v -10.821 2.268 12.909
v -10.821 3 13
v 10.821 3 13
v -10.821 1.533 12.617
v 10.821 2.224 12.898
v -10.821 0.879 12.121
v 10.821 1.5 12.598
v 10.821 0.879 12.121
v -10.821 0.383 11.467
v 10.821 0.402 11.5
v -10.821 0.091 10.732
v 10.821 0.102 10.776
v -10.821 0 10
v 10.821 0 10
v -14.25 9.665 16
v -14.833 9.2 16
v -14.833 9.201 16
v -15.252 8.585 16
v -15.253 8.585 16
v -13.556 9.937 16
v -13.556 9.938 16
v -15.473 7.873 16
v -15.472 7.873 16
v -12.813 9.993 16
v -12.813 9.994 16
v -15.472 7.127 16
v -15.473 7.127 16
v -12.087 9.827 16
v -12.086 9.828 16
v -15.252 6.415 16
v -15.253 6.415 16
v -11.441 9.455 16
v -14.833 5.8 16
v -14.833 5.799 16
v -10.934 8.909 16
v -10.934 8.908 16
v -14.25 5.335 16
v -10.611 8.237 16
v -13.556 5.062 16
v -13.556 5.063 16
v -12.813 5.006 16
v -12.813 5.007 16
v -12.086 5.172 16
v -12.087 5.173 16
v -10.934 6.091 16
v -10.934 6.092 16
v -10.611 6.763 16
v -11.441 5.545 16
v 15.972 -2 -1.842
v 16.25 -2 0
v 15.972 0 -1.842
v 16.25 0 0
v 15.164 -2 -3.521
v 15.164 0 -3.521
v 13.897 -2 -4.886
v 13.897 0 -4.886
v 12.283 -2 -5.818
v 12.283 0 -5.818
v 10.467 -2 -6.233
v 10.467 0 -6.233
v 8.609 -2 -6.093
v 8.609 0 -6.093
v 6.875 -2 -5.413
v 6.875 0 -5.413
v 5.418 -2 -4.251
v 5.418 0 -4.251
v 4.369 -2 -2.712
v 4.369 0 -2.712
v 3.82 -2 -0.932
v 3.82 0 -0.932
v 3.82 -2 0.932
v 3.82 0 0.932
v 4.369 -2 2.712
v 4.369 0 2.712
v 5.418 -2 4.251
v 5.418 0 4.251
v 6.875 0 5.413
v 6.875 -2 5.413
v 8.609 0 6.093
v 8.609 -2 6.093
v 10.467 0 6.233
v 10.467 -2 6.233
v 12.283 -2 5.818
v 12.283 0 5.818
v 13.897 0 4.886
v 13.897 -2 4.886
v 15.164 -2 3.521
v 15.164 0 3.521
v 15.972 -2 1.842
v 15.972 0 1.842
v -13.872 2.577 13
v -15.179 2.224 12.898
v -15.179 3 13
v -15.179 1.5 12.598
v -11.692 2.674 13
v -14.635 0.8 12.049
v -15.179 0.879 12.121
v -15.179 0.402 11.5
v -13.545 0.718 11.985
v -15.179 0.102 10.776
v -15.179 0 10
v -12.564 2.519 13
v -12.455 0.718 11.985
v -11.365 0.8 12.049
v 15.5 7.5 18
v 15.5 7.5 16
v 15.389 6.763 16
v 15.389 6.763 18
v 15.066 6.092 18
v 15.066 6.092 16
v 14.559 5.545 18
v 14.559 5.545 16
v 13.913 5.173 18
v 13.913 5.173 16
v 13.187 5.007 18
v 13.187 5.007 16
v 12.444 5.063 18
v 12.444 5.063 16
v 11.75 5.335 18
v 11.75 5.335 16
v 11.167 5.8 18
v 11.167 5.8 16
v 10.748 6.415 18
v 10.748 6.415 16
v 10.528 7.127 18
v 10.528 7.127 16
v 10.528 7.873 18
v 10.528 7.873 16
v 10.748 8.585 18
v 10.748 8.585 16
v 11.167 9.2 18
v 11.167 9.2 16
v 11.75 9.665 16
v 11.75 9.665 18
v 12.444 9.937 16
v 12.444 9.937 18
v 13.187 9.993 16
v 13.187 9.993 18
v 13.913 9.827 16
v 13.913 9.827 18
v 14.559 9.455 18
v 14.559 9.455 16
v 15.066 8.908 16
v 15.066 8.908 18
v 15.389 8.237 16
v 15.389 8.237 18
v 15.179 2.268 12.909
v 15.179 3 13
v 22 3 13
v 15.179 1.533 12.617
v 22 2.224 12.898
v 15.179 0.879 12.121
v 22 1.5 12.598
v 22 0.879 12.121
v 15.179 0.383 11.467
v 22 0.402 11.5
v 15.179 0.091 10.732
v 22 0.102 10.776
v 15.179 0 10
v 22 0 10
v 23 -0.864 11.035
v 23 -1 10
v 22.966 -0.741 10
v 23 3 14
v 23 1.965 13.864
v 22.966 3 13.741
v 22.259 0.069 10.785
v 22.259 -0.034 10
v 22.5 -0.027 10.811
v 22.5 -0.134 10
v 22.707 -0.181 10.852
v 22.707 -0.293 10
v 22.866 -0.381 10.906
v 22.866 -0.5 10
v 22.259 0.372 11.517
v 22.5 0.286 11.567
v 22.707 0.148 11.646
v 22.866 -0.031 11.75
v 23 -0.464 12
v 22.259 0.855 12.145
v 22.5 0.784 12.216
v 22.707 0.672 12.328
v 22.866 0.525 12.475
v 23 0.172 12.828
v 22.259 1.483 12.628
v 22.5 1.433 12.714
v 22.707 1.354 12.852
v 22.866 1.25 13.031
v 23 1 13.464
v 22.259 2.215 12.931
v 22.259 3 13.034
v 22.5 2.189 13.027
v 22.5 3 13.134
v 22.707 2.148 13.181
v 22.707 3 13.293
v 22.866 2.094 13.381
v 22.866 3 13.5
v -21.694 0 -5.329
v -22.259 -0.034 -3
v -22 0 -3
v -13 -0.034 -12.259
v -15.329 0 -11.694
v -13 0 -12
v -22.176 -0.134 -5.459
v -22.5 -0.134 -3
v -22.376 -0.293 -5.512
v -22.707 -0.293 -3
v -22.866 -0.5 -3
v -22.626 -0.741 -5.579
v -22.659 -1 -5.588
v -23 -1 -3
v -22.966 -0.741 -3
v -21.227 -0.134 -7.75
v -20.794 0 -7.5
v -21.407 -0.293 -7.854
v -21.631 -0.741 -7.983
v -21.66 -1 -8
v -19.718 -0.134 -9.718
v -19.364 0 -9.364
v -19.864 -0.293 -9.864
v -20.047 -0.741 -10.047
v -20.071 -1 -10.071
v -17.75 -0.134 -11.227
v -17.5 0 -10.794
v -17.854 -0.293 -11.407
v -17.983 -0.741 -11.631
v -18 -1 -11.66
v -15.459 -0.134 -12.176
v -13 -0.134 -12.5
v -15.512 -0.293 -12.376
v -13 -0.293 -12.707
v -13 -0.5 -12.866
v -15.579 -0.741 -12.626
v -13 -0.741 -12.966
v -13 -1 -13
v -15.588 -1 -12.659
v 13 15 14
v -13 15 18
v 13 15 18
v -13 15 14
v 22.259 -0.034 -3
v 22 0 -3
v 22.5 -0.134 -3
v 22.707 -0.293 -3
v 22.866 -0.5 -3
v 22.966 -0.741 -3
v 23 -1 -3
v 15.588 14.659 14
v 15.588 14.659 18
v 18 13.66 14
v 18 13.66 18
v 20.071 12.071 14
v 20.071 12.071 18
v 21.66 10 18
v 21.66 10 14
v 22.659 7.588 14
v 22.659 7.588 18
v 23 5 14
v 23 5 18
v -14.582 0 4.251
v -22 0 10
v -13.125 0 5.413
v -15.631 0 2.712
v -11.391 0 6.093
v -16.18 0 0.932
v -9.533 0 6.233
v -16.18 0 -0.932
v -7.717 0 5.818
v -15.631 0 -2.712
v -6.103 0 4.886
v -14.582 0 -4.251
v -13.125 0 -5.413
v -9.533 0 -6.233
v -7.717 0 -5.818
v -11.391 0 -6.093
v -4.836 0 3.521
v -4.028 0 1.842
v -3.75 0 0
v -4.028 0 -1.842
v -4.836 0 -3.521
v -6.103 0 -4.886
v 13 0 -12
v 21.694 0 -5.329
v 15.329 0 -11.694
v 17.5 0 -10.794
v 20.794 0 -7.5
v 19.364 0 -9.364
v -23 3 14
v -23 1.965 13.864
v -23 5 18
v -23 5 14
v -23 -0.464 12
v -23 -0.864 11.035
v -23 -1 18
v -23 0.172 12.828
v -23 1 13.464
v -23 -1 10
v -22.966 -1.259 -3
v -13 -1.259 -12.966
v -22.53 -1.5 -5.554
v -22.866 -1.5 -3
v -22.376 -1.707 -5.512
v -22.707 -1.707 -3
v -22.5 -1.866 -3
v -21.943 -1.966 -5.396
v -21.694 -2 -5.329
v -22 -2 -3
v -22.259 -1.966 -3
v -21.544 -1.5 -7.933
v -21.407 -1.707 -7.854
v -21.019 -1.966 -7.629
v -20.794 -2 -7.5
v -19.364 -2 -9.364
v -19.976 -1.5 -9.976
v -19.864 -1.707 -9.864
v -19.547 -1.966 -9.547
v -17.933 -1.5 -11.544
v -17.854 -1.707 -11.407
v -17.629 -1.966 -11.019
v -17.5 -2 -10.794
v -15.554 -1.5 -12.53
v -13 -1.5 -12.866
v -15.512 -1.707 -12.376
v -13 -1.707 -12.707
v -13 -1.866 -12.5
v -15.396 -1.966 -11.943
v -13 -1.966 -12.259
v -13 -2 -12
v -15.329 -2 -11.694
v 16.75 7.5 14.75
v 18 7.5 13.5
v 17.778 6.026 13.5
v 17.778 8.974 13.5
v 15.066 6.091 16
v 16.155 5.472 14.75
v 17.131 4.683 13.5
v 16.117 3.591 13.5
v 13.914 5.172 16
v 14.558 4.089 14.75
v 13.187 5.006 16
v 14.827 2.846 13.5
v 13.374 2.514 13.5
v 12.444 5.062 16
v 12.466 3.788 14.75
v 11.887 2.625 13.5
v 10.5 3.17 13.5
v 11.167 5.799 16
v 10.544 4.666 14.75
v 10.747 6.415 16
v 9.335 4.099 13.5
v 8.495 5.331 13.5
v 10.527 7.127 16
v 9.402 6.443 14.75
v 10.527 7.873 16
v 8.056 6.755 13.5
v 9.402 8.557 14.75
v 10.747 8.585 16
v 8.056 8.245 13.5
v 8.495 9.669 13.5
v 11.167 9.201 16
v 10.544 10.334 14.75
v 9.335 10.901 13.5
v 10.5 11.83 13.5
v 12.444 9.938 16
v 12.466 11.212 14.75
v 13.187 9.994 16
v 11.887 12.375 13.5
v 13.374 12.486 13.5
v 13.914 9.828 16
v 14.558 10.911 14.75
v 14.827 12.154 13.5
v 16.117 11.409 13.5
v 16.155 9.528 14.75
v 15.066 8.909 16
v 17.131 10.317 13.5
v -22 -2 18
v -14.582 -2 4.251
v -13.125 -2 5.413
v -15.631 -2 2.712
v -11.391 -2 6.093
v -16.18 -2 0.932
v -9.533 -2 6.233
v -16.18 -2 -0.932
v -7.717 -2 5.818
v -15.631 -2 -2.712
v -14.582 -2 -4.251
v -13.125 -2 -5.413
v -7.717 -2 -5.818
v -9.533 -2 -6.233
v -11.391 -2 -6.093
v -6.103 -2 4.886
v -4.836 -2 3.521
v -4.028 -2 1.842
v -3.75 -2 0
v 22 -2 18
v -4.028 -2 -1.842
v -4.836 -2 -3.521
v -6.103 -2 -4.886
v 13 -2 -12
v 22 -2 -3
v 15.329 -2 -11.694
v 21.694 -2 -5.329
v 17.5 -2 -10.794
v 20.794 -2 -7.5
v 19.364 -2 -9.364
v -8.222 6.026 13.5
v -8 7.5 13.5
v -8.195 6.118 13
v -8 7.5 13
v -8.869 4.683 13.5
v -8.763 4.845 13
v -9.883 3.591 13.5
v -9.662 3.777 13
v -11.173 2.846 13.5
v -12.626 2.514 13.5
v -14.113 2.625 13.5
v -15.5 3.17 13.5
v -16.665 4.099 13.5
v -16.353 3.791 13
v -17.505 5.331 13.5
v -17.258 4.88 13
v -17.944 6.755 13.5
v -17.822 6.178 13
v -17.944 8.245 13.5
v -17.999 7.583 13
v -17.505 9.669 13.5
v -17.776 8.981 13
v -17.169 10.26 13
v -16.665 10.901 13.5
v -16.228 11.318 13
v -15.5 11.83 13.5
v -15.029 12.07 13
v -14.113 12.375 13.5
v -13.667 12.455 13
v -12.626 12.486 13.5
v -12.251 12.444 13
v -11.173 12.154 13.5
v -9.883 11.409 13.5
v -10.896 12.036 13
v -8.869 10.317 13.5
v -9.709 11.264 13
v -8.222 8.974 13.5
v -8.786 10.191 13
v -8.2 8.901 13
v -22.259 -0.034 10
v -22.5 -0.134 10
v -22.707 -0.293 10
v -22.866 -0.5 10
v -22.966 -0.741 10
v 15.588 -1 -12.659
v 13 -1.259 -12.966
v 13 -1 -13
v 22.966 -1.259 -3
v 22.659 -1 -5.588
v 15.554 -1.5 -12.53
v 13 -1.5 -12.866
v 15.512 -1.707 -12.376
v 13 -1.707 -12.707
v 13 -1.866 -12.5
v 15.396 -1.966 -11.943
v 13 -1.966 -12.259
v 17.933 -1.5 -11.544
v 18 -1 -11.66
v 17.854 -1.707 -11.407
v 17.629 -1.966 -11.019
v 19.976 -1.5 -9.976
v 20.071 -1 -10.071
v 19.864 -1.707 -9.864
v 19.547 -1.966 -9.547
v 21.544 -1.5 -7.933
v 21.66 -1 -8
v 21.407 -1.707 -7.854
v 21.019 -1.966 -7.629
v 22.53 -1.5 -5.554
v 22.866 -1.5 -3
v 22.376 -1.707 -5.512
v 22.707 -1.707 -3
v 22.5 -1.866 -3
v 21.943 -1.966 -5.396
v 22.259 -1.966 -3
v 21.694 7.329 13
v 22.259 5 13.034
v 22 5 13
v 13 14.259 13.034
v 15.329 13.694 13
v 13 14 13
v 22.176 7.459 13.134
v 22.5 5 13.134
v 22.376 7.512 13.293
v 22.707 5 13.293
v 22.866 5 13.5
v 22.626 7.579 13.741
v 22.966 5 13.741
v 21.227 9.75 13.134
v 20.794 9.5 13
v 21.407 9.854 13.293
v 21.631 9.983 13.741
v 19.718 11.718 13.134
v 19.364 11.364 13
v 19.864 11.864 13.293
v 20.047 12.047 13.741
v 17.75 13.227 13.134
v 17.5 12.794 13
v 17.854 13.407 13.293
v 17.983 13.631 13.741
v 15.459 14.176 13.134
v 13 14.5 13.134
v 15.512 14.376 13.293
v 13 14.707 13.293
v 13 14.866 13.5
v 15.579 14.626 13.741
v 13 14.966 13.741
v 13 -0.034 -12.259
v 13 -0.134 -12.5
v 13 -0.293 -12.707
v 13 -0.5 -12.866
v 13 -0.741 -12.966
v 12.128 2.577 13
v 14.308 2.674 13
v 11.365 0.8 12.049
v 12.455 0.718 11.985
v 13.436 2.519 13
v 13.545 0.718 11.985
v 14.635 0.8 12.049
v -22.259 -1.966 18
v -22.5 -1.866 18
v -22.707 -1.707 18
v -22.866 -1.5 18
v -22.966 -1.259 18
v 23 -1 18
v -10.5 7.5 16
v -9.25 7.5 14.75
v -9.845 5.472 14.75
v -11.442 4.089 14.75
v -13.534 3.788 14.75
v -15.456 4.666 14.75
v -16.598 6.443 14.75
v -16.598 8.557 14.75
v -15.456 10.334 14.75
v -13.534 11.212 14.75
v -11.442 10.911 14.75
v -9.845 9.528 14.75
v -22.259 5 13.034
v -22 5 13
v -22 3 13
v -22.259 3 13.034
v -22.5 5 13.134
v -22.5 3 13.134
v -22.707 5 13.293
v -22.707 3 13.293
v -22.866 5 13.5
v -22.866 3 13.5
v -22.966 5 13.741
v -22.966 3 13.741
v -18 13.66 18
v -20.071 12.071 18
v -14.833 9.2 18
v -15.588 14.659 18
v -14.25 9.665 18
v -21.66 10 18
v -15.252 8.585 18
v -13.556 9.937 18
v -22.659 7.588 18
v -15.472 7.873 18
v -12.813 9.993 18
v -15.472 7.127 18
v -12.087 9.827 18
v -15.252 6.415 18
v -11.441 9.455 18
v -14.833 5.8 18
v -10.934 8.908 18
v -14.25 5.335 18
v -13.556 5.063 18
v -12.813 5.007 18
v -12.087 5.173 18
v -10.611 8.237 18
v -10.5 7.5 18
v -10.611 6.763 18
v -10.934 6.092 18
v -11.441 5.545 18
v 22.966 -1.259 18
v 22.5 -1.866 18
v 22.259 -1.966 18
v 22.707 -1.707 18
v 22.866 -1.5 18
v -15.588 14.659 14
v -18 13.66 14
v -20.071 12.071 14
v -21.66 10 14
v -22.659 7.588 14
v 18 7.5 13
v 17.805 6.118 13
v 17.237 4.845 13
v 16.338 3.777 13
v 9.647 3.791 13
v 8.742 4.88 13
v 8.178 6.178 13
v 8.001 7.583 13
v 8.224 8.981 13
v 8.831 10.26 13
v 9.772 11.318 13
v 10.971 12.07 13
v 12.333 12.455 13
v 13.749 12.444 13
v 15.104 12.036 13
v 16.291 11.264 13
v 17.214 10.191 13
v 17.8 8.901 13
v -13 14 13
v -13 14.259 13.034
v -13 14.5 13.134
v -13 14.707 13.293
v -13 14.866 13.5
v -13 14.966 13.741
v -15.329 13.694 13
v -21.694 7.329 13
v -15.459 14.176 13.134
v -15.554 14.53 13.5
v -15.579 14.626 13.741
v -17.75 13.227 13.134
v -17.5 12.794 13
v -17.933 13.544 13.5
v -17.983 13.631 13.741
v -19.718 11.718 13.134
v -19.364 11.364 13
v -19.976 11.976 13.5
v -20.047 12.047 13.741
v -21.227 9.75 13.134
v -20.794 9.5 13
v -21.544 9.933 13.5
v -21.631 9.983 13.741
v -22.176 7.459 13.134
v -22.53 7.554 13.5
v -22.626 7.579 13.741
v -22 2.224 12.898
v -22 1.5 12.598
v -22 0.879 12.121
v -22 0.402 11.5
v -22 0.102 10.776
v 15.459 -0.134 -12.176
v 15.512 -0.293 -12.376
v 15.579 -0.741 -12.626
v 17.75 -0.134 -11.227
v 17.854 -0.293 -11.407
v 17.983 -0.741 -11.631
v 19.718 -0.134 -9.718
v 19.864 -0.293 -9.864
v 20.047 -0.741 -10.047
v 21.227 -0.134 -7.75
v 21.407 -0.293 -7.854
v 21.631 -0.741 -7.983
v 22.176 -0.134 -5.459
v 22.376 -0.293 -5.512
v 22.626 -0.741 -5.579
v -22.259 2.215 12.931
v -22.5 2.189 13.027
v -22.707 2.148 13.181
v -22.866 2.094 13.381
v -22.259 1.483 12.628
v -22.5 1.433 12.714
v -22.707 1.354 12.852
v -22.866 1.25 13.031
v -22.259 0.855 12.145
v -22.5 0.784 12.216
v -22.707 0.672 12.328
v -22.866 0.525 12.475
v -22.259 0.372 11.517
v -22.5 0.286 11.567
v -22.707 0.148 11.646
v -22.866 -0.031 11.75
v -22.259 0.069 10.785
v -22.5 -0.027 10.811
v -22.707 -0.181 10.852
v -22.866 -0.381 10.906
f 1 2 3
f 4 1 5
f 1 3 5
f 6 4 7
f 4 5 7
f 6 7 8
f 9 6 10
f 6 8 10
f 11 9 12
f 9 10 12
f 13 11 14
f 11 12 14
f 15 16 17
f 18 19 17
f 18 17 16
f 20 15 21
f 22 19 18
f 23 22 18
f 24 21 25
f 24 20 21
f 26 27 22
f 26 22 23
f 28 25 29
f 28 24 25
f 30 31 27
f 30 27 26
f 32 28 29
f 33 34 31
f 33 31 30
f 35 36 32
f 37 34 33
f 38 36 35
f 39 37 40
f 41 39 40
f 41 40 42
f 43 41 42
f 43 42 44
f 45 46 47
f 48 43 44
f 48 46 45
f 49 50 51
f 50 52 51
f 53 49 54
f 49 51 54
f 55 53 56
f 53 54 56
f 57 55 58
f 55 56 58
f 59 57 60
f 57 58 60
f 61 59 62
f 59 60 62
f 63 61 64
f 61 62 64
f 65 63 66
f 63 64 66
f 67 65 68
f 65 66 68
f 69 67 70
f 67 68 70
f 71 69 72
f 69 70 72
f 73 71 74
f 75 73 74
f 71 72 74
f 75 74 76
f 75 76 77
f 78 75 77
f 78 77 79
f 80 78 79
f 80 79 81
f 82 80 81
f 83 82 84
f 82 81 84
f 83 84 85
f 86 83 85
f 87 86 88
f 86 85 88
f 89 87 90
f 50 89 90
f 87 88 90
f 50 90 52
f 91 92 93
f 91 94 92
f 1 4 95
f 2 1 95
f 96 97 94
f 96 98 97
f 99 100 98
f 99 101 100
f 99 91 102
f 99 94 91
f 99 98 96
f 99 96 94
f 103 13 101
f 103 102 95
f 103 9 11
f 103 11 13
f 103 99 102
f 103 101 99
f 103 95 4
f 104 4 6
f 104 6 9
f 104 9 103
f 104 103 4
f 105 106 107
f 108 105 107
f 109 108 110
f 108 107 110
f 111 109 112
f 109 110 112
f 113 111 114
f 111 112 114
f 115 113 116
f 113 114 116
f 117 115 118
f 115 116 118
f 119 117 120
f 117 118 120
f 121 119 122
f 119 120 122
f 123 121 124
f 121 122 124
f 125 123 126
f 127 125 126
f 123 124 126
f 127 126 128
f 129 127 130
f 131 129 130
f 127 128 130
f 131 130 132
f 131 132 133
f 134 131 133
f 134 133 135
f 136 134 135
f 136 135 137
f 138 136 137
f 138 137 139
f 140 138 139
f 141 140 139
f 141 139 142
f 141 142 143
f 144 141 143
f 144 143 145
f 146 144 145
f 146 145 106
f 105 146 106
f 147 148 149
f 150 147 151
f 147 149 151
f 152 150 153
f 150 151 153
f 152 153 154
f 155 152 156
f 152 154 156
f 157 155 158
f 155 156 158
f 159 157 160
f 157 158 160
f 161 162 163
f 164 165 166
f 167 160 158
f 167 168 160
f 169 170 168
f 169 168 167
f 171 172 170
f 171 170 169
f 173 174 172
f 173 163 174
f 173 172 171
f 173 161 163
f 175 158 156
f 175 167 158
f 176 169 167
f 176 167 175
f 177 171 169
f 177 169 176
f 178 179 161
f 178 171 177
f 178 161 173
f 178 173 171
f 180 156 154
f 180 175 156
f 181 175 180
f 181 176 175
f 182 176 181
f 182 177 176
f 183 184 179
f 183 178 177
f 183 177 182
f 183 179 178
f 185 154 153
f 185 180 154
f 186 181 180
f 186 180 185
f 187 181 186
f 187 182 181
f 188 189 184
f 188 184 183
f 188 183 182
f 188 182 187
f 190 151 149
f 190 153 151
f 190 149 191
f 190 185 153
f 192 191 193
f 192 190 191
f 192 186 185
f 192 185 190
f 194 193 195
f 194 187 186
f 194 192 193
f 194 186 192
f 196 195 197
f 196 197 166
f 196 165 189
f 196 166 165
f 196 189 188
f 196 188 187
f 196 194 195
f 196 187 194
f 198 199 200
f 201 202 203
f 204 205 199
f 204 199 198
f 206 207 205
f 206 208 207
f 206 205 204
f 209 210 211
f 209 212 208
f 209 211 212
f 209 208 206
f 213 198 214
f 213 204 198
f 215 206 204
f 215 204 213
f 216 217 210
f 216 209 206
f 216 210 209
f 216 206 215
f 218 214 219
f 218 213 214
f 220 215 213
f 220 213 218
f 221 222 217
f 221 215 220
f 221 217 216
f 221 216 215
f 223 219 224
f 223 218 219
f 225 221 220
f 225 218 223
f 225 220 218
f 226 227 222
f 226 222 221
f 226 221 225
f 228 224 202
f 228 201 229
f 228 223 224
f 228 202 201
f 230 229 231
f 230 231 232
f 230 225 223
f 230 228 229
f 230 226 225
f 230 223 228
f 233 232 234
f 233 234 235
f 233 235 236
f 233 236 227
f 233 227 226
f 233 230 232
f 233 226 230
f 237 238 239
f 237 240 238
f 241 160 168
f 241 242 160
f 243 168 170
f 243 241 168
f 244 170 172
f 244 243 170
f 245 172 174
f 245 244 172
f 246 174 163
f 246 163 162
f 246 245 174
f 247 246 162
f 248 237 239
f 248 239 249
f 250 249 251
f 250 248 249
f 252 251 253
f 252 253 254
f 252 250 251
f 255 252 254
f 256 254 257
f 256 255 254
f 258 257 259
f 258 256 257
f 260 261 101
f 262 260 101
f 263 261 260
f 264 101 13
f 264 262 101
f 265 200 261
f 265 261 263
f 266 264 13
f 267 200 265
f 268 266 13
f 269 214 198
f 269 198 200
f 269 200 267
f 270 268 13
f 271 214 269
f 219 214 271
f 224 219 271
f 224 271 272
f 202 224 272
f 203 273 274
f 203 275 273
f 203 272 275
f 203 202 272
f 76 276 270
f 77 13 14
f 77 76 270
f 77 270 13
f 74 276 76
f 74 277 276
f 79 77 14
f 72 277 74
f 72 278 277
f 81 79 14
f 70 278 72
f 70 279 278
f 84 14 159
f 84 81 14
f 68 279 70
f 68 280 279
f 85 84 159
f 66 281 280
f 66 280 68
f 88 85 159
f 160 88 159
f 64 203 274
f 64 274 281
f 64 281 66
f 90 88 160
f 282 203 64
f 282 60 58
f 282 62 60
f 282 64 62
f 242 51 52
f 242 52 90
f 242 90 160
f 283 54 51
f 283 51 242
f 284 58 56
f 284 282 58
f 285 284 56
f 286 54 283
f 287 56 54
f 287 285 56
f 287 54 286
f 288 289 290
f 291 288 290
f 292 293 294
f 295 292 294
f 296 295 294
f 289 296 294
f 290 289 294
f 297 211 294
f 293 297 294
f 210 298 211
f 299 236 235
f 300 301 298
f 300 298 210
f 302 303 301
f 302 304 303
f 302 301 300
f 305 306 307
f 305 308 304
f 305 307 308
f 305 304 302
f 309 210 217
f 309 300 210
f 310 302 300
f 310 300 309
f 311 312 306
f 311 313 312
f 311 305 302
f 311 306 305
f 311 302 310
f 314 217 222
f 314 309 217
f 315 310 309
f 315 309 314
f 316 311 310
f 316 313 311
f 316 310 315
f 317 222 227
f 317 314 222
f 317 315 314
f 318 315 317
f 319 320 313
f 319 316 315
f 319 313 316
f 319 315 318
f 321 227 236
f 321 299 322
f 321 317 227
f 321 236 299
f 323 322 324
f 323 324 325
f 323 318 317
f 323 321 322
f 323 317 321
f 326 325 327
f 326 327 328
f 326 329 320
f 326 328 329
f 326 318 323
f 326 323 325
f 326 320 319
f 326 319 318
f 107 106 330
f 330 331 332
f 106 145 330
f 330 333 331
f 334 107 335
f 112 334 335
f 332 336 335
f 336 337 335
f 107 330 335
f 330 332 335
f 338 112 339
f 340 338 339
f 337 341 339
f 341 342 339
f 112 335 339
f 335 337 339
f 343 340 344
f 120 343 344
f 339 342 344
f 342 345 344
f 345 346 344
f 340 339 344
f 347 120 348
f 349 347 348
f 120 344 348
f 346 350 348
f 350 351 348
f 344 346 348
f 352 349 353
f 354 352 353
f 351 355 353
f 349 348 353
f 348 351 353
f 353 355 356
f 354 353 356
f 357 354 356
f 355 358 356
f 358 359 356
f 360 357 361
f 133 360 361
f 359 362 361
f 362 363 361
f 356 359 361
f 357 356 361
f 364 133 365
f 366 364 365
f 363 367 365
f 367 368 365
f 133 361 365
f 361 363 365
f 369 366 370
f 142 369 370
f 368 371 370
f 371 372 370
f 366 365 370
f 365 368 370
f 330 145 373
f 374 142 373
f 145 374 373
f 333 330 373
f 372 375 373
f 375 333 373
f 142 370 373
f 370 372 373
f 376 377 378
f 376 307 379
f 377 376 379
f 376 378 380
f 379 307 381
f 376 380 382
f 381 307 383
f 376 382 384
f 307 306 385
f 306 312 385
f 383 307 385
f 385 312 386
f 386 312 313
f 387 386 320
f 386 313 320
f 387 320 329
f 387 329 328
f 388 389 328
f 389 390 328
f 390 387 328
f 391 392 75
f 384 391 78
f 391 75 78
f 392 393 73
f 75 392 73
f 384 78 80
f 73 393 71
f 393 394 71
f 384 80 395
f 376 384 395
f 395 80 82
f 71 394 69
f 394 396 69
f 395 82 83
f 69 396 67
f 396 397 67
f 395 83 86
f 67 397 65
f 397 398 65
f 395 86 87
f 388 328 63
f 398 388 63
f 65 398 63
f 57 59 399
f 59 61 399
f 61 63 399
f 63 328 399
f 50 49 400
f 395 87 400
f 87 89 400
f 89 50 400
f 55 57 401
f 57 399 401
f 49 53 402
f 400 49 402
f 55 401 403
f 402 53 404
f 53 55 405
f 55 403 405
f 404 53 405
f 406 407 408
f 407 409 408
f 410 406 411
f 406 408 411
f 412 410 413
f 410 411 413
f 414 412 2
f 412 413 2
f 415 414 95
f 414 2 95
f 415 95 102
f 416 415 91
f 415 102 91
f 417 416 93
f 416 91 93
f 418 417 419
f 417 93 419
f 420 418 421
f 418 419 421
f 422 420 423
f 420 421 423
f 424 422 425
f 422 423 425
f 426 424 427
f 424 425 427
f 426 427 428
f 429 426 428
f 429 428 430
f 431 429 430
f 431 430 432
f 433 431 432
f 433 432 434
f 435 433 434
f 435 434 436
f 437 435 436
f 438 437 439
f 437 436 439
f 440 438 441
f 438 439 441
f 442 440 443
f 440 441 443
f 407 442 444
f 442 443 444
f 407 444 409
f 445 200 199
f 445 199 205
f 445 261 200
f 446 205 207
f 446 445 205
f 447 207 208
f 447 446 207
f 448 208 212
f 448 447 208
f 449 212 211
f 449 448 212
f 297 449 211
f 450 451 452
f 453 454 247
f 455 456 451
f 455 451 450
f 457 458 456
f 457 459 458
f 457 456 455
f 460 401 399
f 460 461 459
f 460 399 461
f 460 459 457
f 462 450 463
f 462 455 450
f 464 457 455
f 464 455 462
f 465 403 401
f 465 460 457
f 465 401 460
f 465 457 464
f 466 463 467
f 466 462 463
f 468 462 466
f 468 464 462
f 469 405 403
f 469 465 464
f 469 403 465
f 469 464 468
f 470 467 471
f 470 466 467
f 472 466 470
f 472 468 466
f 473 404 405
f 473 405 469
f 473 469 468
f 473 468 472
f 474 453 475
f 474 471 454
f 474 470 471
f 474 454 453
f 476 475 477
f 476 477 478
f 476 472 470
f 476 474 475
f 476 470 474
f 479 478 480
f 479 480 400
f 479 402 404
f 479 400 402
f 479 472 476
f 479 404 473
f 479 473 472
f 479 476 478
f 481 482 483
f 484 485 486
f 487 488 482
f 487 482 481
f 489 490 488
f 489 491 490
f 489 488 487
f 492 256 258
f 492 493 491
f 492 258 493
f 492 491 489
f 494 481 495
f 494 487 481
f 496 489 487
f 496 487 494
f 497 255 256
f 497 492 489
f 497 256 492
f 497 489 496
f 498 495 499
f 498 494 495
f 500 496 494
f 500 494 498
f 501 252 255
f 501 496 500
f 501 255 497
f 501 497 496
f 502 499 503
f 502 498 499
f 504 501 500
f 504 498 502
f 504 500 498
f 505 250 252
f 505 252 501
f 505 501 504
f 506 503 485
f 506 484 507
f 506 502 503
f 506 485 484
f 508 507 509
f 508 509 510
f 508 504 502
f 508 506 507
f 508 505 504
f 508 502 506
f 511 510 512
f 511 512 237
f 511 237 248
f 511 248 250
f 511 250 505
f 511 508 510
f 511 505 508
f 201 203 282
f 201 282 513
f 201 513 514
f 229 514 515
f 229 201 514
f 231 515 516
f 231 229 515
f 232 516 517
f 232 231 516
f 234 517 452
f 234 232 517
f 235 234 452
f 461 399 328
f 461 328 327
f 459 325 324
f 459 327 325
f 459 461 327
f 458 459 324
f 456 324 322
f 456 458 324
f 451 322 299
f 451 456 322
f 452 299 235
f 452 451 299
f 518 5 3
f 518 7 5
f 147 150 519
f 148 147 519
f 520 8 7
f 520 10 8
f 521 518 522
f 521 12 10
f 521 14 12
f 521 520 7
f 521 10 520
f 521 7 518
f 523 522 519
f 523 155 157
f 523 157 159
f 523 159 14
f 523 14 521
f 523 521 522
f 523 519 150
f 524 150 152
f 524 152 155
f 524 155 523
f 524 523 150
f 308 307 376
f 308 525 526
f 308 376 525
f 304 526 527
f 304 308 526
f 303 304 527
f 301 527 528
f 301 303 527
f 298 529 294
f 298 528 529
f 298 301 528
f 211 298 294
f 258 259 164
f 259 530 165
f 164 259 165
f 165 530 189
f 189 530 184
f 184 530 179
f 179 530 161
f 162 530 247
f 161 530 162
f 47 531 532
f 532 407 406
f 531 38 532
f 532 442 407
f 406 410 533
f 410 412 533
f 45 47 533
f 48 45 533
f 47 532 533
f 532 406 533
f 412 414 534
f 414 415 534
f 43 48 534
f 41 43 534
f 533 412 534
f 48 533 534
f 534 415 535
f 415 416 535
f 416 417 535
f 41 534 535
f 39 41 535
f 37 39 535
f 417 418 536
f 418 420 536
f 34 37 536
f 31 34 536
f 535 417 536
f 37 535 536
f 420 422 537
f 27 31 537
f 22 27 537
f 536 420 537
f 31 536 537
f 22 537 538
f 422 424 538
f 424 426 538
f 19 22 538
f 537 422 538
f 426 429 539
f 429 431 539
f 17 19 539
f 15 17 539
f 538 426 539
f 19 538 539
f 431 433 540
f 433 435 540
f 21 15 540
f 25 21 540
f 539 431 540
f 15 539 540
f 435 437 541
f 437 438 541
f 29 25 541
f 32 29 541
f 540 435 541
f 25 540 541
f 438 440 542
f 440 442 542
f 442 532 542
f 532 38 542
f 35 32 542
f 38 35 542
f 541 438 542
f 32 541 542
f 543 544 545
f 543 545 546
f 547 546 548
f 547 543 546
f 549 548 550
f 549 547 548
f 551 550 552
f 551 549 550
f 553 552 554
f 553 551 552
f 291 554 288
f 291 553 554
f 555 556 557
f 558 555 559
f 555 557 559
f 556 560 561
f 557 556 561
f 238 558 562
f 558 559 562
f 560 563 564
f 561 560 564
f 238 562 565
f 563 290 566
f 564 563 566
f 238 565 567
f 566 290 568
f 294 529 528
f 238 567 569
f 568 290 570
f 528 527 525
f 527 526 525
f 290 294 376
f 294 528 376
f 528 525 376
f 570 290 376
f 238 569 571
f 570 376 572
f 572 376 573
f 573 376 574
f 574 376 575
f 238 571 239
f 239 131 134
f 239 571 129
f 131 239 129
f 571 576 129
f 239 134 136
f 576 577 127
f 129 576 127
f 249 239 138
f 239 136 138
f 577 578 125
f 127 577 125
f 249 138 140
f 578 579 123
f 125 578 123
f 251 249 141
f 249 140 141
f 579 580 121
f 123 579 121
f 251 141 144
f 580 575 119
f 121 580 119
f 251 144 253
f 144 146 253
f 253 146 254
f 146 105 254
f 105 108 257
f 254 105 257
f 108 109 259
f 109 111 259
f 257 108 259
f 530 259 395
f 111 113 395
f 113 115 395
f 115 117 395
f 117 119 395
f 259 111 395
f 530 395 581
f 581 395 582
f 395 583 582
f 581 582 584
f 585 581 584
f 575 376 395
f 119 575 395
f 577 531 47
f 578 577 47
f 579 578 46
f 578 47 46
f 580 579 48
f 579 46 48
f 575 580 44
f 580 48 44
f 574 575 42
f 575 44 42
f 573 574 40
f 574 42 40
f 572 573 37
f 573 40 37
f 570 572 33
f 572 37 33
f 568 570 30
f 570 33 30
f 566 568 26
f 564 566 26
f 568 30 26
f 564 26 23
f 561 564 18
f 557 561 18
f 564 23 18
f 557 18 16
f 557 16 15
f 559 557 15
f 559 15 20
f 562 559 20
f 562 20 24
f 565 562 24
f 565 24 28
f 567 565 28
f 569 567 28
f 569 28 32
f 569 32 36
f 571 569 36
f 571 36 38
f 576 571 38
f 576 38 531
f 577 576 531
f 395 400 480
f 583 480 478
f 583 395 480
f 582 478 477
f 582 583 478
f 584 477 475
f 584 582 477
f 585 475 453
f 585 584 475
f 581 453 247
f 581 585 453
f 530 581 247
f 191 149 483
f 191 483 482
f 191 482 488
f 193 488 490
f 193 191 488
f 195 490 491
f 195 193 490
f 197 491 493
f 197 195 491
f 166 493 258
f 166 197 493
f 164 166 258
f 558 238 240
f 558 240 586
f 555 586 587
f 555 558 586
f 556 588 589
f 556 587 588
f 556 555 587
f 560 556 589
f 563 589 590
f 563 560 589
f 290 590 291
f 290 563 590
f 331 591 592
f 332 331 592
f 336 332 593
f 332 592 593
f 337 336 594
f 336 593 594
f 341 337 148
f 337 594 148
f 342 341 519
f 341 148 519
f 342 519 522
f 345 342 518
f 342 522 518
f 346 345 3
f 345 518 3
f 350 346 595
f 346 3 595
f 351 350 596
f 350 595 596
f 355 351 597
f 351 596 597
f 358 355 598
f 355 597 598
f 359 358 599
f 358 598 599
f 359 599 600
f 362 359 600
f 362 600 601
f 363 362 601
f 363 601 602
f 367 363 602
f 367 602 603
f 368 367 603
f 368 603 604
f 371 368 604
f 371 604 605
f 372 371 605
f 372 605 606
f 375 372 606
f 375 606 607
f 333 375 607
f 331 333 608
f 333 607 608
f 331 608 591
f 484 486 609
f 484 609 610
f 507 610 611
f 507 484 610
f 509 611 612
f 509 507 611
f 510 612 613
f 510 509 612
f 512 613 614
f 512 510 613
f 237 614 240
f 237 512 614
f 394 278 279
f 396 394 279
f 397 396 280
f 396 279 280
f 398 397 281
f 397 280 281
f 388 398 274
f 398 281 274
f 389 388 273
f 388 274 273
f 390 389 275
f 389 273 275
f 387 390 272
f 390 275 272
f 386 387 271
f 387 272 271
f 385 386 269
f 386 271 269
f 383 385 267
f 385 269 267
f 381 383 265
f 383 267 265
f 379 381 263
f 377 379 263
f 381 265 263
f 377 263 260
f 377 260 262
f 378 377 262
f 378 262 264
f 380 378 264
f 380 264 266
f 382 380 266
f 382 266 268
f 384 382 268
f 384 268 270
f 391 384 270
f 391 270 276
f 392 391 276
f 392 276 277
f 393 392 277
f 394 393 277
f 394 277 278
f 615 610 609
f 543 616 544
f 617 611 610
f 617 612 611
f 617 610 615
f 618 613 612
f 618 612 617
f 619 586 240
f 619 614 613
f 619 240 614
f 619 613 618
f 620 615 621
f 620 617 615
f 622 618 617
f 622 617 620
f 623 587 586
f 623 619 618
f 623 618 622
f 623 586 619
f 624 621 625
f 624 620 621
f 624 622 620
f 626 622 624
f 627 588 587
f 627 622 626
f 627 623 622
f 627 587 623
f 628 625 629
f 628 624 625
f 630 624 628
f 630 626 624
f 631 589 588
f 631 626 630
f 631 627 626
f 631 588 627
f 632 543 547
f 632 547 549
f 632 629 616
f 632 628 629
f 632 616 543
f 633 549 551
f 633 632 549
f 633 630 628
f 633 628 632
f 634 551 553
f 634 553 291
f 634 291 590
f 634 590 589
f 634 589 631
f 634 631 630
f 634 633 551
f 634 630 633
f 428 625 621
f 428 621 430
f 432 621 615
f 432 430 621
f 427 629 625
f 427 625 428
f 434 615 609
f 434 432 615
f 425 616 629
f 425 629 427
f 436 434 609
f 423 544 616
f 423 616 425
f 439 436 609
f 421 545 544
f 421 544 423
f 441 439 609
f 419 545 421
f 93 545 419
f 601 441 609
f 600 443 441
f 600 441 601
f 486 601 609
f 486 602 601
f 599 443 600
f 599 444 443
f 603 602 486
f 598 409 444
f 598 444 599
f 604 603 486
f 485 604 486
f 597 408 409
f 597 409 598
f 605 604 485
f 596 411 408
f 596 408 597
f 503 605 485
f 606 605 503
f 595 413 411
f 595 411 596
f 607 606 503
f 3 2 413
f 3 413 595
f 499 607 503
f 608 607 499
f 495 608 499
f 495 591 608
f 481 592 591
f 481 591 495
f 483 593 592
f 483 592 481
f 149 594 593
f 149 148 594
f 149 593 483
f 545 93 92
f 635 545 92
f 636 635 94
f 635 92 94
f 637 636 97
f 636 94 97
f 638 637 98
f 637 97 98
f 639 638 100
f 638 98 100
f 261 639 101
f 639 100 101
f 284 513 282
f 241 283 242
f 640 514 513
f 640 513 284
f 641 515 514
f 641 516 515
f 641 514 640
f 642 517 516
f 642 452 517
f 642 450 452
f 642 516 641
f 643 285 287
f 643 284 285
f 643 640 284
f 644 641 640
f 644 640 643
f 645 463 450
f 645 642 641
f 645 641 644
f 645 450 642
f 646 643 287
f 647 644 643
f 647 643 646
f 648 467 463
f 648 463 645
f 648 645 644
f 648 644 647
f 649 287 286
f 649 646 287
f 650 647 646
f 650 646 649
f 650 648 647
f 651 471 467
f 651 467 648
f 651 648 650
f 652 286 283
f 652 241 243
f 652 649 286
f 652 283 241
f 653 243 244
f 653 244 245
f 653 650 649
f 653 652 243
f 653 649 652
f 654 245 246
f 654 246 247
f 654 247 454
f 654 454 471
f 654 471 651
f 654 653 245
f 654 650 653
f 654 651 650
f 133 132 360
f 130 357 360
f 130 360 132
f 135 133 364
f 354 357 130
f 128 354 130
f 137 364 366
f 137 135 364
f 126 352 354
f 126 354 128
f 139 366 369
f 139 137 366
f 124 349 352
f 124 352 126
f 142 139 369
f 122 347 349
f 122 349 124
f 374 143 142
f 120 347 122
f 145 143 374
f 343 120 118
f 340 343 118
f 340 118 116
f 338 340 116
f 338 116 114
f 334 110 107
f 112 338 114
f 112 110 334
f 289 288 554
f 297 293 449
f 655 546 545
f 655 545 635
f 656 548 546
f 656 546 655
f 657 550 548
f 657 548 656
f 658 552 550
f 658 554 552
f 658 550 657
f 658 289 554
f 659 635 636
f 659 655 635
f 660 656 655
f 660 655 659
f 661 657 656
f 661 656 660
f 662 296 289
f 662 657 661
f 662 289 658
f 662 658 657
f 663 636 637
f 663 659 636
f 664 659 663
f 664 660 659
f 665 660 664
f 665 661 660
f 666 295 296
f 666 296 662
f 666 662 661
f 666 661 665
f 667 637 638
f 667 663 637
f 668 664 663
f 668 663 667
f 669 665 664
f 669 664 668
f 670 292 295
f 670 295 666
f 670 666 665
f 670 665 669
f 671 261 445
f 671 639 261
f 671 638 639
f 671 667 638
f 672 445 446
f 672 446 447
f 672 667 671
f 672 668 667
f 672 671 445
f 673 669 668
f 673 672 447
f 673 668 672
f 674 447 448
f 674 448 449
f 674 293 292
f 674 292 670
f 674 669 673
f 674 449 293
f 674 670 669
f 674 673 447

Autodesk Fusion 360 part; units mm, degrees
sketch "Sketch1" plane through (0, 0, 0) normal (0, 1, 0) x (1, 0, 0)
  circle A0 centre (-10, 0) radius 6.25
  circle A1 centre (-10, 0) radius 9
  circle A2 centre (10, 0) radius 6.25
  circle A3 centre (10, 0) radius 9
  line L0 (-23, -18) -> (23, -18)
  line L1 (23, -18) -> (23, 3)
  line L2 (13, 13) -> (-13, 13)
  line L3 (-23, 3) -> (-23, -18)
  line L4 (-23, -13) -> (23, -13)
  arc A4 (23, 3) -> (13, 13) centre (13, 3) ccw
  arc A5 (-13, 13) -> (-23, 3) centre (-13, 3) ccw
  dimension "d1" = 12.5
  dimension "d2" = 12.5
  dimension "d3" = 18
  dimension "d4" = 18
  dimension "d5" = 10
  dimension "d6" = 10
  dimension "d7" = 13
  dimension "d9" = 13
  dimension "d10" = 10
  dimension "d11" = 13
  dimension "d12" = 10
  dimension "d13" = 13
  dimension "d14" = 5
extrude "Extrude1" add sketch "Sketch1" against normal blind 2 contours A1 | A3 | L0 L1 L3 L4 | L1 L2 L3 L4 A4 A5
extrude "Extrude2" add sketch "Sketch1" along normal blind 15 contours L0 L1 L3 L4
sketch "Sketch2" plane through (0, 0, 13) normal (0, 0, -1) x (1, 0, 0)
  line L0 (23, 0) -> (-23, 0)
  line L1 (-23, 0) -> (-23, -15)
  line L2 (-23, -15) -> (23, -15)
  line L3 (23, -15) -> (23, 0)
  circle A0 centre (13, -7.5) radius 2.5
  circle A1 centre (-13, -7.5) radius 2.5
  circle A2 centre (-13, -7.5) radius 5
  circle A3 centre (13, -7.5) radius 5
  dimension "d19" = 5
  dimension "d20" = 5
  dimension "d21" = 10
  dimension "d22" = 10
  dimension "d23" = 7.5
  dimension "d24" = 7.5
  dimension "d25" = 10
  dimension "d26" = 10
extrude "Extrude3" cut sketch "Sketch2" against normal up to surface (5 mm away) contours A0 | A1
extrude "Extrude4" cut sketch "Sketch2" against normal up to surface (3 mm away) contours A2 | A3
chamfer "Chamfer1" distance 2.5 angle 45 2 edges at (8.3384, 9.3081, 16) (-17.6616, 9.3081, 16)
fillet "Fillet1" radius 10 2 edges at (23, 15, 15.5) (-23, 15, 15.5)
fillet "Fillet2" radius 3 1 edges at (0, 0, 13)
fillet "Fillet3" radius 1 17 edges at (-23, -2, 7.5) (-20.0711, -2, -10.0711) (0, -2, -13) (20.0711, -2, -10.0711) (23, -2, 7.5) (0, 15, 13) (-20.0711, 12.0711, 13) (-23, 4, 13) (-23, 0.8787, 12.1213) (-23, 0, 3.5) (-20.0711, 0, -10.0711) (0, 0, -13) (20.0711, 0, -10.0711) (23, 0, 3.5) (23, 0.8787, 12.1213) (23, 4, 13) (20.0711, 12.0711, 13)
equation "d1 = d2"
equation "d4 = d3"
equation "d9 = d7"
equation "d11 = d7"
equation "d13 = d7"
equation "d20 = d19"
equation "d22 = d21"
equation "d24 = d23"
equation "d26 = d25"
